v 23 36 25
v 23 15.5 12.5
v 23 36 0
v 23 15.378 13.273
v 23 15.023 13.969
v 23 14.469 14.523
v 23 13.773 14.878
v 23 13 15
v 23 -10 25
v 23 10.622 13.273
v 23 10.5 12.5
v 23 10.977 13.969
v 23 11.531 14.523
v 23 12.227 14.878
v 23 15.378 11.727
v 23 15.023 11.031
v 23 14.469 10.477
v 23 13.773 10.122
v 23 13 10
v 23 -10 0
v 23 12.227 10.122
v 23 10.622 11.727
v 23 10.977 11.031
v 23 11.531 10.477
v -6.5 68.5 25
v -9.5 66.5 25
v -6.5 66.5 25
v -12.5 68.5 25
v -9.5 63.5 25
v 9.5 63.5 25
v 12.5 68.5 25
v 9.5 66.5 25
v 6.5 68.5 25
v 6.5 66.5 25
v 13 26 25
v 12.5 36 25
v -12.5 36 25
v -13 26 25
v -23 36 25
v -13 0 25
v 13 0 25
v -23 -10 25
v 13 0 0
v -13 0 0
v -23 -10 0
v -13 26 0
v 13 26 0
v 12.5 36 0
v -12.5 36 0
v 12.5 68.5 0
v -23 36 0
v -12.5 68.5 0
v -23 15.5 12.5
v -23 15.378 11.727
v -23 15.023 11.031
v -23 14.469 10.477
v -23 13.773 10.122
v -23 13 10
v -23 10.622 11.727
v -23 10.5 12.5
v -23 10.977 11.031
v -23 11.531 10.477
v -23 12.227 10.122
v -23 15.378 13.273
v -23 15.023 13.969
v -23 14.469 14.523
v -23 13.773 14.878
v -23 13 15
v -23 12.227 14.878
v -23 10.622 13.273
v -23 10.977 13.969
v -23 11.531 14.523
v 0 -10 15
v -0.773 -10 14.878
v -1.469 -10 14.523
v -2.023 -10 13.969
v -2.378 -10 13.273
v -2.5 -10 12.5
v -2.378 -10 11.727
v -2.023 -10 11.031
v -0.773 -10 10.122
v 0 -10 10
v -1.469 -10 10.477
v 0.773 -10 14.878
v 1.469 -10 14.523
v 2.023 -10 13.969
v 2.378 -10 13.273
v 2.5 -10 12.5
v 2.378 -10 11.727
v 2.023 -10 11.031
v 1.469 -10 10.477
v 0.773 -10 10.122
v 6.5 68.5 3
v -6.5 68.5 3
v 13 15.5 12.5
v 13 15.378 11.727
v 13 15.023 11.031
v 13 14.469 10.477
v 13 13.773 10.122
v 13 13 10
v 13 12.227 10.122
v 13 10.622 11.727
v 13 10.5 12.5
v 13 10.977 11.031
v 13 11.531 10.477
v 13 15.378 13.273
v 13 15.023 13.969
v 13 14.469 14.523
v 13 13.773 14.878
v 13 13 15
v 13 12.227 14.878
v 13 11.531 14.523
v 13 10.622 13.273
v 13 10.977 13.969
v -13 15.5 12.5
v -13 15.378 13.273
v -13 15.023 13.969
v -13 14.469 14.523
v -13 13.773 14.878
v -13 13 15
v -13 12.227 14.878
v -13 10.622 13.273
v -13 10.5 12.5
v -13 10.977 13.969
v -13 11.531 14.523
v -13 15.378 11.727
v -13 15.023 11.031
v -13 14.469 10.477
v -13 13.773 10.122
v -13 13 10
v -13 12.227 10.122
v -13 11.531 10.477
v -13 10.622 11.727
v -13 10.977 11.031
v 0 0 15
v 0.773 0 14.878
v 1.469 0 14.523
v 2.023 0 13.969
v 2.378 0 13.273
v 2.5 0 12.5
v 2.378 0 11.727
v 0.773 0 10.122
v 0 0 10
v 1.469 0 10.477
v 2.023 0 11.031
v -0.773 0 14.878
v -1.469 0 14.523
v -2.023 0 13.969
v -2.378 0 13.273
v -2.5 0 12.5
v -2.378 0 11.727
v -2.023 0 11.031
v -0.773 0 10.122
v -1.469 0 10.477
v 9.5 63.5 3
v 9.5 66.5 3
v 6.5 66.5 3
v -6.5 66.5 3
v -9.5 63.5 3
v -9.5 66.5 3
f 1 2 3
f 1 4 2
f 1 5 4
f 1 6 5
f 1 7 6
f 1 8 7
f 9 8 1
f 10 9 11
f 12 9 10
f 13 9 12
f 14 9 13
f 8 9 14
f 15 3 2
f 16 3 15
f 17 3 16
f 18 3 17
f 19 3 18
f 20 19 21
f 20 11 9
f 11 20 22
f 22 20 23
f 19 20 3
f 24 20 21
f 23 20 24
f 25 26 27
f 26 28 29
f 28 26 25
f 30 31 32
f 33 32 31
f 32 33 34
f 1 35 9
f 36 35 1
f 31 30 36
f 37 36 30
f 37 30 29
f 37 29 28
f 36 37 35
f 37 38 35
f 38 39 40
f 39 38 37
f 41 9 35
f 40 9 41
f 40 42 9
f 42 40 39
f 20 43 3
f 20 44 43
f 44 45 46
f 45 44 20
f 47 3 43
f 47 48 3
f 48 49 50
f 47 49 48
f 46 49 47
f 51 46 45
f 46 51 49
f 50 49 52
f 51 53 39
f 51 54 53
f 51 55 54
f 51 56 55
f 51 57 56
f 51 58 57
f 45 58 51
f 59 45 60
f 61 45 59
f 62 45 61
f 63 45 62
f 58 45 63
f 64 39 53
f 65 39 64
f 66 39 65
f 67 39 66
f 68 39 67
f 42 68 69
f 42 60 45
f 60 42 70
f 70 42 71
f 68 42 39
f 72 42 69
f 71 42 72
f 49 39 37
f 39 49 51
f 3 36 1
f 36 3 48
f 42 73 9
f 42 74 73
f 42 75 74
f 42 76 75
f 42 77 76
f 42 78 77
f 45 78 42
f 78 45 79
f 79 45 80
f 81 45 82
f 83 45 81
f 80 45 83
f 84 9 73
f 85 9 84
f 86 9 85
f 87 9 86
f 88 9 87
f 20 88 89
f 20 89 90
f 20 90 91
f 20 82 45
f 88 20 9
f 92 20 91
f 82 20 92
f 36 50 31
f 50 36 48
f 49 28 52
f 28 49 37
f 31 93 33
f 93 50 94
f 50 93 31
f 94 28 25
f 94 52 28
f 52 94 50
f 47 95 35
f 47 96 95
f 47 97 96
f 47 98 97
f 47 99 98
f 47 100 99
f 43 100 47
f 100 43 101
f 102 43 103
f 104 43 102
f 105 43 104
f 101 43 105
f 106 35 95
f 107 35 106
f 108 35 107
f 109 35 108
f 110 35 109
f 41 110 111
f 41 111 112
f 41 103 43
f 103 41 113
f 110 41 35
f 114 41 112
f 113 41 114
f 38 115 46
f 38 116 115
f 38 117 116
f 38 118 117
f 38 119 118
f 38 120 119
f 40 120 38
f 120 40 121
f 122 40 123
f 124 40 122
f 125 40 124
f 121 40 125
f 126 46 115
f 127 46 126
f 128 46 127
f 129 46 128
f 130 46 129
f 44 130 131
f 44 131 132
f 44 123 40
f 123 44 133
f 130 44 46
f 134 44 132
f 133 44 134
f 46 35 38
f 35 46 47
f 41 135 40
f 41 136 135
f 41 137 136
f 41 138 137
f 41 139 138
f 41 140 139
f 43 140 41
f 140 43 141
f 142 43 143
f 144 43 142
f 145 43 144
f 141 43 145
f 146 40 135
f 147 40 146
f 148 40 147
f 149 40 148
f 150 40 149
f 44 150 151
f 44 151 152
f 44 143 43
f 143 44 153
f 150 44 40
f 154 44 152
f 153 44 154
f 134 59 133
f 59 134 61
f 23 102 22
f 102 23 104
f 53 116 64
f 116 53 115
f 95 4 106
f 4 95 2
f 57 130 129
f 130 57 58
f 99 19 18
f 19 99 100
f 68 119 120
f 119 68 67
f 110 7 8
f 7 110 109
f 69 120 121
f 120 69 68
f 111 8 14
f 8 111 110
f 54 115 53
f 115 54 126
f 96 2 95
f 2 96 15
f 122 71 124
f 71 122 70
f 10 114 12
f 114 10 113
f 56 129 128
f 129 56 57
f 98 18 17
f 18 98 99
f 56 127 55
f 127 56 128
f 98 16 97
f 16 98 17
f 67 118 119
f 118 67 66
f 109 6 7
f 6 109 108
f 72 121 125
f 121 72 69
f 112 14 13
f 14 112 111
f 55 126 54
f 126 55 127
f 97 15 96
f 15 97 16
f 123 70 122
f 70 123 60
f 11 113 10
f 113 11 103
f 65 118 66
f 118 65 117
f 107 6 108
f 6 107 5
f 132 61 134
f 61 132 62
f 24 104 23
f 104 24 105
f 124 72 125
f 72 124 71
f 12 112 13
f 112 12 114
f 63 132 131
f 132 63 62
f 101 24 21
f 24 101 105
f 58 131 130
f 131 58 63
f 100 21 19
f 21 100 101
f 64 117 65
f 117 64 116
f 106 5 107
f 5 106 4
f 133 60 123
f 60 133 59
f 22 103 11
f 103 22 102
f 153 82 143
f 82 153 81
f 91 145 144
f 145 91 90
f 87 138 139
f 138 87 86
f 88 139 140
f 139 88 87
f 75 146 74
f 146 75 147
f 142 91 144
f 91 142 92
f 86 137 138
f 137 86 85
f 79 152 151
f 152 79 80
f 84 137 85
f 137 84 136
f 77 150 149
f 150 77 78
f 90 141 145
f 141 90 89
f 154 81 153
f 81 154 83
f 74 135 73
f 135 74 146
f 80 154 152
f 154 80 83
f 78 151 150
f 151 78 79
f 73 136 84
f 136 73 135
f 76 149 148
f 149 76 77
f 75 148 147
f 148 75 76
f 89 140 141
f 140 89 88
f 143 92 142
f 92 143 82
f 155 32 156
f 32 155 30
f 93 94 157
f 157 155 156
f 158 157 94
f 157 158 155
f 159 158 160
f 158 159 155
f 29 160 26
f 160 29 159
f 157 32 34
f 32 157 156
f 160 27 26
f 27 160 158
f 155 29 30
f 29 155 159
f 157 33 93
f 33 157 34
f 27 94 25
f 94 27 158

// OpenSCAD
// file: variables.scad
// Slide imager variables

//Design and code by Simon Harris, BGS
// simhar@bgs.ac.uk | www.SHphoto.co.uk

//the centre height of the optical system
centerheight=97.5;
// the rail size, allowing a slight positive tolerance (25.4mm becomes 26mm)
rail=26;
//rear filter glass diameter and thickness - remove from holder wearing eye protection
filterdia=63;
filterthick=3;
//diffuser plate dimensions
diffuserdia=60;
diffuserthick=3;
//pivot arm length for filter
pivot=50;
//front filter dimensions - leave in holder
camerafilterdia=57;
camerafilterthread=55;
camerafiltermass=28;
//counterweights
counterweightlength=38.5;
counterweightwidth=13.5;
counterweightmass=12.75 * 3;
//servo dimensions, allowing a slight positive tolerance (0.5mm?) and relative positions of pivot point with wire at bottom, as well as max dimension across ears
servox=12;
servoy=23;
servoxpivot=6;
servoypivot=8;
servoears=32;
// main file
//A simple slide block that allows 6mm fixings on the rail

//Design and code by Simon Harris, BGS
// simhar@bgs.ac.uk | www.SHphoto.co.uk

//You should examine and adjust the file variables.scad to modify this design
include <variables.scad>;
//rail size is taken from the global variables file
slideblockthickness=10;
slideblockheight=25;
centreheight=0;
//measure the distance from the centre of the light to the base of the foot
lightheight=60;


difference(){

union(){
//slide block
translate([-slideblockthickness-rail/2,-centreheight-slideblockthickness,0])
cube([rail+slideblockthickness+slideblockthickness,rail+slideblockthickness+slideblockthickness,slideblockheight]);
//light support
translate([-12.5,0,0])
cube([25, rail+centerheight-lightheight+5, slideblockheight]);
}
//support rail
translate([-(rail)/2,-centreheight,-10])
cube([rail,rail,60]);

//clamp screws to rail
translate([-75,-centreheight+(rail/2),slideblockheight/2])
rotate([0,90,0])
cylinder(h = 150, r=2.5, center = false, $fn=20);

translate([0,25,slideblockheight/2])
rotate([90,0,0])
cylinder(h = 50, r=2.5, center = false, $fn=20);

//foot of light
translate([-9.5,rail+centerheight-lightheight,3])
cube([19, 3, slideblockheight]);
translate([-6.5,rail+centerheight-lightheight+3,3])
cube([13, 5, slideblockheight]);
}
